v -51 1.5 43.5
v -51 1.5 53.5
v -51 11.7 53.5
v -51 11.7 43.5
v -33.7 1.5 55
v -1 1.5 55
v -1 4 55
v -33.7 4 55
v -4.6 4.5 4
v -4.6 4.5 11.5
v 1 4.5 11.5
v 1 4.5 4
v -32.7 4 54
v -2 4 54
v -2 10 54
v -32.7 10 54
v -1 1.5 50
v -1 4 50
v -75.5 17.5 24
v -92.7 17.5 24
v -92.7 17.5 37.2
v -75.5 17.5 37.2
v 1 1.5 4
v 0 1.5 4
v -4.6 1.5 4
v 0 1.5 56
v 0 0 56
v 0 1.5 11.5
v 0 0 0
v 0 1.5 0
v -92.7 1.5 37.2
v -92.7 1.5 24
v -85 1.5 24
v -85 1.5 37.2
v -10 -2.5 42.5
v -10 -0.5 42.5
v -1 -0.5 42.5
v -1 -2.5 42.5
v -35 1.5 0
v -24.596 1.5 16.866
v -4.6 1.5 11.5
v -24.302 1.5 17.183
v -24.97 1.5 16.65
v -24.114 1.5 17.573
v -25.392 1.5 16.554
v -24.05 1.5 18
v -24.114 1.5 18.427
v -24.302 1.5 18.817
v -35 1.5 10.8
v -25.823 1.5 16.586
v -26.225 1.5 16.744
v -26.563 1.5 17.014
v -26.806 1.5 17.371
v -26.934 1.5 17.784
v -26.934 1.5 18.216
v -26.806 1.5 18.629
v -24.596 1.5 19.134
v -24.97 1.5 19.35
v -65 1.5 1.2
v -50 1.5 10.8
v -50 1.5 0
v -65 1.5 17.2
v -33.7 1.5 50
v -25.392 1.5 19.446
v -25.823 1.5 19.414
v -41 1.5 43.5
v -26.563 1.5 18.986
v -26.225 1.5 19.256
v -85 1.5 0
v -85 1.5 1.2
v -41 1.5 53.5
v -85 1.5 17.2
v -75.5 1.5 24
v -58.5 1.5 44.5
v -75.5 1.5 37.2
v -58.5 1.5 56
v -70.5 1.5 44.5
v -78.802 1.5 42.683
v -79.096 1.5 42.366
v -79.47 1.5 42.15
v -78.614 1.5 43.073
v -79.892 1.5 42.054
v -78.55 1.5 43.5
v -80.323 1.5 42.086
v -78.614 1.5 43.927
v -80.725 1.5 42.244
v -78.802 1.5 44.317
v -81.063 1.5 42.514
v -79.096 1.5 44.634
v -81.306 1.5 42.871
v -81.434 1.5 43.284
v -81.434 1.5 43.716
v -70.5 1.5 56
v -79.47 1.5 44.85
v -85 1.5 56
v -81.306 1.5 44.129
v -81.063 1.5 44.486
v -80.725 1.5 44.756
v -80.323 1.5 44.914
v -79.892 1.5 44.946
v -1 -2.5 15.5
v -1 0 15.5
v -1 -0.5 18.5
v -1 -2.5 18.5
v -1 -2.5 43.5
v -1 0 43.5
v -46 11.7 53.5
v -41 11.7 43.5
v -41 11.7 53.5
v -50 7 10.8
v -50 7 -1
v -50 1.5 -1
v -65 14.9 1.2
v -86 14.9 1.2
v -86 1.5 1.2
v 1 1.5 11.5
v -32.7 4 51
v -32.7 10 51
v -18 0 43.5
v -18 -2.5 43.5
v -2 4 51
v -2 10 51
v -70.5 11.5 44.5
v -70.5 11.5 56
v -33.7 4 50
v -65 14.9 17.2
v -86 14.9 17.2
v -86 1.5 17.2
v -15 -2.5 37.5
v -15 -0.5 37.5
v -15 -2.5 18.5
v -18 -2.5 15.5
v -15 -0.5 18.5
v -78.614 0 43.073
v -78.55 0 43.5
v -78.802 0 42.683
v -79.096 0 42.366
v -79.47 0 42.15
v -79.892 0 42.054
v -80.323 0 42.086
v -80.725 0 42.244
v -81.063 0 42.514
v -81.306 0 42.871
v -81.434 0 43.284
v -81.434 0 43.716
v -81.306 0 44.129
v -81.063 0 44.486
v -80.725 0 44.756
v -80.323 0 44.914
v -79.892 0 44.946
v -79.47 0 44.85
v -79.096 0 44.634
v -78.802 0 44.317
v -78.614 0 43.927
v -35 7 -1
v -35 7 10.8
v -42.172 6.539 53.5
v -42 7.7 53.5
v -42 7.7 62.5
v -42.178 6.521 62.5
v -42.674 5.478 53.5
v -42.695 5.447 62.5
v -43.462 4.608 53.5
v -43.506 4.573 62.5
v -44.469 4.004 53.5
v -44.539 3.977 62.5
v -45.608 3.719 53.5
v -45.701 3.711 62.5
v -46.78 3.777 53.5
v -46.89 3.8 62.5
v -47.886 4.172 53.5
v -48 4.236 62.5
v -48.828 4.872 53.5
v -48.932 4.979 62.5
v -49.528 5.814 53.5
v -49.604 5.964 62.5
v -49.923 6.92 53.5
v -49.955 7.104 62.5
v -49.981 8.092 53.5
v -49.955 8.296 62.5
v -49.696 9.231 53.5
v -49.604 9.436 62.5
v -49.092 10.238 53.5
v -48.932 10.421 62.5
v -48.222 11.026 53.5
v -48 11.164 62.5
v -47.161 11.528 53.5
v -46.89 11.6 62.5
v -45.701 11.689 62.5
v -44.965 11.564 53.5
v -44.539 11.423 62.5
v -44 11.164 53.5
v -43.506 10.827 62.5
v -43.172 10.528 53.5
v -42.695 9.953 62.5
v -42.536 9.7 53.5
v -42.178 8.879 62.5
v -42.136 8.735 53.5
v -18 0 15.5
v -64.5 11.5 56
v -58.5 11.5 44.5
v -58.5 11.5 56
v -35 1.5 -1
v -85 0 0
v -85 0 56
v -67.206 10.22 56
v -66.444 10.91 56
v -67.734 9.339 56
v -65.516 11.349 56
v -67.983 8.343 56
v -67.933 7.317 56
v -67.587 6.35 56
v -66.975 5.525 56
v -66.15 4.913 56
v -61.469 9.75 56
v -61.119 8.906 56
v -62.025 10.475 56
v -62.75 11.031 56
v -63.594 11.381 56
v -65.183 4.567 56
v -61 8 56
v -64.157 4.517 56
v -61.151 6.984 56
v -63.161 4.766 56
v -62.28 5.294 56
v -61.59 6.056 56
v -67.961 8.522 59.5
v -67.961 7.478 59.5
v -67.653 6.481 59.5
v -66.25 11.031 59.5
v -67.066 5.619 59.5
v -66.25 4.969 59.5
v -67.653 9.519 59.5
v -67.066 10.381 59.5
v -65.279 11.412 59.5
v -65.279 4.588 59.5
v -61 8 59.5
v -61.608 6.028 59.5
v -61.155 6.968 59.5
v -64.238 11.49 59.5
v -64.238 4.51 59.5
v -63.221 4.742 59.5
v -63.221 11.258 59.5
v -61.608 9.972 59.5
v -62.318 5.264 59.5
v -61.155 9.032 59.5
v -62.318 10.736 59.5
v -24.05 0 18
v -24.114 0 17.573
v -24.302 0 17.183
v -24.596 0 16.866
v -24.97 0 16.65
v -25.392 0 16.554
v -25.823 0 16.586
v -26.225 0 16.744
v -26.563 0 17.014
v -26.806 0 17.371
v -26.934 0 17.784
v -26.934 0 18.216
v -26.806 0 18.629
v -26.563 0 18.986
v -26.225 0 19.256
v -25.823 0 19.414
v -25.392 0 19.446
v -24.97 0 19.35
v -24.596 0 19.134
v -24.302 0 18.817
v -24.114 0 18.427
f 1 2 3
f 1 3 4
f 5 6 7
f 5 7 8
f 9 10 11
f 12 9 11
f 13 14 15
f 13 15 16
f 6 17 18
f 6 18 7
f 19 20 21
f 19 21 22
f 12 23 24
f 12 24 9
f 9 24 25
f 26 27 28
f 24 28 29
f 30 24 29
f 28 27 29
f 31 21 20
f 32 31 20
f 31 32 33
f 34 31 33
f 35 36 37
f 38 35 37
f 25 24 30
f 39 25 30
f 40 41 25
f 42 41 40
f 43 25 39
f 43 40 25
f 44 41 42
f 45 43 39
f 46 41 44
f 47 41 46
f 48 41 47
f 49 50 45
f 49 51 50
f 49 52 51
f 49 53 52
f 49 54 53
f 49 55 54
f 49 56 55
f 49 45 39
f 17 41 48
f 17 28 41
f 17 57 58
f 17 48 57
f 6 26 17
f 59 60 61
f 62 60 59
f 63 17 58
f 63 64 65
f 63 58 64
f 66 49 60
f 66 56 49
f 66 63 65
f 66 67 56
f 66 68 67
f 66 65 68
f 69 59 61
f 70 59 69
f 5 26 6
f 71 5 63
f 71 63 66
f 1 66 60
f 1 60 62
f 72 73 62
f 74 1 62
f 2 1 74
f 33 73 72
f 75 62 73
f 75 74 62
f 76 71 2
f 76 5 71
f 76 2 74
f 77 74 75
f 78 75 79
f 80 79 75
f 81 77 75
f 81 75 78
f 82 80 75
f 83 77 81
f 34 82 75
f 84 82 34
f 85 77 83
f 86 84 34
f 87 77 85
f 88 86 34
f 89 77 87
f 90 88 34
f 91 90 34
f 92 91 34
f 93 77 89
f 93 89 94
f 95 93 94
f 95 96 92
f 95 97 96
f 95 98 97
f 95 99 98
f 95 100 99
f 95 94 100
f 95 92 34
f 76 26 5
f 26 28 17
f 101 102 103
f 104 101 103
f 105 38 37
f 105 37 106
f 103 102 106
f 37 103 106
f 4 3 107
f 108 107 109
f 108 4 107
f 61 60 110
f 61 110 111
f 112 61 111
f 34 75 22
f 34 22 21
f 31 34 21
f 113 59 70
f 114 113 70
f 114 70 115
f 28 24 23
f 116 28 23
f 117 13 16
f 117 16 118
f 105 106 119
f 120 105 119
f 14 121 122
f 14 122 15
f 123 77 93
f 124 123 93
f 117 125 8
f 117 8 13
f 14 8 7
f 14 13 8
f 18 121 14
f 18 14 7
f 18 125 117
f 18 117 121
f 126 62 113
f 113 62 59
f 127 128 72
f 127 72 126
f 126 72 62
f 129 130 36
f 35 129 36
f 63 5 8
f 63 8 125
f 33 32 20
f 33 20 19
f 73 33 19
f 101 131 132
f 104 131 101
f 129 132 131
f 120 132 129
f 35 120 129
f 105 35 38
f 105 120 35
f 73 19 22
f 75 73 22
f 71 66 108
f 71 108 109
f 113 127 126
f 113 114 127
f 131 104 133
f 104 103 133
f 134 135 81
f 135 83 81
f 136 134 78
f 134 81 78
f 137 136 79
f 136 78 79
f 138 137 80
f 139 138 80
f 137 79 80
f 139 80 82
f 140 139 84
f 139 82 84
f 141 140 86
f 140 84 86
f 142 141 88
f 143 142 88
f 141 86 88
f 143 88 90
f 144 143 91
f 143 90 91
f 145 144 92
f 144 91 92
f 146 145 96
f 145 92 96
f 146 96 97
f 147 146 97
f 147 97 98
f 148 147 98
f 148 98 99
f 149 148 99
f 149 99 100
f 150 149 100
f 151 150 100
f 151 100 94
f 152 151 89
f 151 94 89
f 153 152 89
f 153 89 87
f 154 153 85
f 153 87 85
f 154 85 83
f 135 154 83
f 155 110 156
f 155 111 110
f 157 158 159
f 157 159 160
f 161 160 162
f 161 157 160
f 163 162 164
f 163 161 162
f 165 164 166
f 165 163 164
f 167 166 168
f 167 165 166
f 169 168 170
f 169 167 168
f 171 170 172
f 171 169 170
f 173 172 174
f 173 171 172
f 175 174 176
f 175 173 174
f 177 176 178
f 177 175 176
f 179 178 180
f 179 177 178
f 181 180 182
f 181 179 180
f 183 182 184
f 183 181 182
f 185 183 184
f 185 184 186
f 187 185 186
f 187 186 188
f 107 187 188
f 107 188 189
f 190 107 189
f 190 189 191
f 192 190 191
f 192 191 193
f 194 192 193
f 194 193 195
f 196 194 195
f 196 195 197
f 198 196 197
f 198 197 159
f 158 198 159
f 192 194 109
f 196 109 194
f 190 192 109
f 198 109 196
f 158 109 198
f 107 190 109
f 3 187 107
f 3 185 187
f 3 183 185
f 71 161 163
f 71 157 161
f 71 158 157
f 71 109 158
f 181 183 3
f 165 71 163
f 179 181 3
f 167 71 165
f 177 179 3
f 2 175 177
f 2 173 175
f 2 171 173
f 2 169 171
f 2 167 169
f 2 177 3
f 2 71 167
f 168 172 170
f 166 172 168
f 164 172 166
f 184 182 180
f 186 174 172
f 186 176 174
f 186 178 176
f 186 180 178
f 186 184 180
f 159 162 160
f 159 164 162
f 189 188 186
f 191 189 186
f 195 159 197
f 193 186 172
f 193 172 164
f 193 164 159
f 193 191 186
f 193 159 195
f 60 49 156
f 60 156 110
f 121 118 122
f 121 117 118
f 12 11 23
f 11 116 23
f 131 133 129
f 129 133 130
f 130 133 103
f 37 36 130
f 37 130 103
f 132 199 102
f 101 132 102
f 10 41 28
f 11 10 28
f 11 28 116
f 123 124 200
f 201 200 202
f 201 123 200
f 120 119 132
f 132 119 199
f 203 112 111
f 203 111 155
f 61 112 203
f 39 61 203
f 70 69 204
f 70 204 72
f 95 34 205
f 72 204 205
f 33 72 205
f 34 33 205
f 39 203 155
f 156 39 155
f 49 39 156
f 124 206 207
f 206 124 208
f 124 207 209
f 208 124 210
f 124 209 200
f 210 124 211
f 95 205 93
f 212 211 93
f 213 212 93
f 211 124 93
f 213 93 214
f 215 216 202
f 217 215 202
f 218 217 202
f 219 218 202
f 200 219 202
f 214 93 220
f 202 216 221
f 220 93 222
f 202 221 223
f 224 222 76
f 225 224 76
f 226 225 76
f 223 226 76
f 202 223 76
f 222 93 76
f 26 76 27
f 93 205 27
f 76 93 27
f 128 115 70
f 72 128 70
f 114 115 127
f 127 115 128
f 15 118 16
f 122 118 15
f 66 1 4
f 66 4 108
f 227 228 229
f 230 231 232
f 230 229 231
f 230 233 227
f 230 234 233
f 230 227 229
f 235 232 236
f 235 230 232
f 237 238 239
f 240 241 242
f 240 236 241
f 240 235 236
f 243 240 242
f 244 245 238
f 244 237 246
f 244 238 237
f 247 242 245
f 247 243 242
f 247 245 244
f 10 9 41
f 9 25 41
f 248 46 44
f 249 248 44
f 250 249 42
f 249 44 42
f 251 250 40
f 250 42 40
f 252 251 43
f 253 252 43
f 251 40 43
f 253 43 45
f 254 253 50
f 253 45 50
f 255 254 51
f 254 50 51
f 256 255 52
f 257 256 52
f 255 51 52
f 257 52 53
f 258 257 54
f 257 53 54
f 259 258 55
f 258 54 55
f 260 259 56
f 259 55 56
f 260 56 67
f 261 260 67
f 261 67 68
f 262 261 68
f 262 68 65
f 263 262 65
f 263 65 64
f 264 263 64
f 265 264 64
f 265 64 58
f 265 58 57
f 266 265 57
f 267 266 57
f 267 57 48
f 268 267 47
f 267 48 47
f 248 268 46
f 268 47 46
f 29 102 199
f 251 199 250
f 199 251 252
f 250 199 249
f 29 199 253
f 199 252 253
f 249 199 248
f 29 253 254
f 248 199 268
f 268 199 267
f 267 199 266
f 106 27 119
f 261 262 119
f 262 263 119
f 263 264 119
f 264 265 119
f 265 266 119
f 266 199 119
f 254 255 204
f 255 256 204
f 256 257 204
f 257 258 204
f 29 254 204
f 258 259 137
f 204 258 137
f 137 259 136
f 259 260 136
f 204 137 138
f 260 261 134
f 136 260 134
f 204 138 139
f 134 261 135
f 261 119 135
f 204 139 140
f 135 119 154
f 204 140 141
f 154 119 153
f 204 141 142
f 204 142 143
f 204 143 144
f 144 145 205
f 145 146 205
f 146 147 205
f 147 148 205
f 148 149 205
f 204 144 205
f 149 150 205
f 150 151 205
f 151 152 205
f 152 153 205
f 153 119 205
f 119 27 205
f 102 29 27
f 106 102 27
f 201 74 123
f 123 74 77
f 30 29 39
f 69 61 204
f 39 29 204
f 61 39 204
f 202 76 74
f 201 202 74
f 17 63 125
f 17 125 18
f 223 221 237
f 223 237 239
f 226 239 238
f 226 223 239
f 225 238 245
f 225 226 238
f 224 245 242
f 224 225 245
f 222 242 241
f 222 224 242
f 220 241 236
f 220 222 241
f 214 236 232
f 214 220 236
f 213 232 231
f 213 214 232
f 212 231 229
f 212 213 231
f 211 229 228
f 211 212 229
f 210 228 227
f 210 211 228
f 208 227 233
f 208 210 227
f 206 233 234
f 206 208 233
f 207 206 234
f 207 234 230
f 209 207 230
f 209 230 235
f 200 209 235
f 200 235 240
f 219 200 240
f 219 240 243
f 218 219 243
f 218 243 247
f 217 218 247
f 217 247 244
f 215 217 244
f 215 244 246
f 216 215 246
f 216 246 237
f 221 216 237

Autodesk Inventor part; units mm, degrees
ref_plane "YZ Plane" through (0, 0, 0) normal (1, 0, 0) x (0, 1, 0)
ref_plane "XZ Plane" through (0, 0, 0) normal (0, 1, 0) x (-1, 0, 0)
ref_plane "XY Plane" through (0, 0, 0) normal (0, 0, 1) x (1, 0, 0)
sketch "Skizze1" plane through (0, 0, 0) normal (0, 1, 0) x (-1, 0, 0)
  line L0 (0, 0) -> (85, 0)
  line L1 (85, 0) -> (85, 56)
  line L2 (85, 56) -> (0, 56)
  line L3 (0, 56) -> (0, 0)
  dimension "d0" = 85
  dimension "d1" = 56
extrude "Extrusion1" add sketch "Skizze1" along normal blind 1.5
sketch "Skizze2" plane through (0, 1.5, 0) normal (0, 1, 0) x (1, 0, 0)
  line L0 (0, 0) -> (-85, 0) projected
  line L1 (-86, -17.2) -> (-65, -17.2)
  line L2 (-65, -17.2) -> (-65, -1.2)
  line L3 (-65, -1.2) -> (-86, -1.2)
  line L4 (-86, -1.2) -> (-86, -17.2)
  line L5 (-85, 0) -> (-85, -56) projected
  dimension "d4" = 21
  dimension "d5" = 16
  dimension "d6" = 1.2
  dimension "d84" = 1
extrude "Extrusion2" add sketch "Skizze2" along normal blind 13.4
sketch "Skizze3" plane through (0, 1.5, 0) normal (0, 1, 0) x (1, 0, 0)
  line L0 (-85, -17.2) -> (-85, -56) projected
  line L1 (-92.7, -24) -> (-75.5, -24)
  line L2 (-75.5, -24) -> (-75.5, -37.2)
  line L3 (-75.5, -37.2) -> (-92.7, -37.2)
  line L4 (-92.7, -37.2) -> (-92.7, -24)
  line L5 (-85, -56) -> (0, -56) projected
  dimension "d9" = 7.7
  dimension "d10" = 17.2
  dimension "d11" = 13.2
  dimension "d85" = 18.8
extrude "Extrusion3" add sketch "Skizze3" along normal blind 16
sketch "Skizze4" plane through (0, 1.5, 0) normal (0, 1, 0) x (1, 0, 0)
  line L0 (0, 0) -> (-85, 0) projected
  line L1 (-65, -1.2) -> (-65, -17.2) projected
  line L2 (-50, 1) -> (-35, 1)
  line L3 (-35, 1) -> (-35, -10.8)
  line L4 (-35, -10.8) -> (-50, -10.8)
  line L5 (-50, -10.8) -> (-50, 1)
  dimension "d15" = 1
  dimension "d16" = 15
  dimension "d17" = 11.8
  dimension "d18" = 15
extrude "Extrusion4" add sketch "Skizze4" along normal blind 5.5
sketch "Skizze5" plane through (0, 1.5, 0) normal (0, 1, 0) x (1, 0, 0)
  line L0 (-85, -37.2) -> (-85, -56) projected
  line L1 (-85, -56) -> (0, -56) projected
  line L2 (-58.5, -44.5) -> (-70.5, -44.5)
  line L3 (-70.5, -44.5) -> (-70.5, -56)
  line L4 (-70.5, -56) -> (-58.5, -56)
  line L5 (-58.5, -56) -> (-58.5, -44.5)
  line L6 (-70.5, -56) -> (-58.5, -56)
  dimension "d21" = 11.5
  dimension "d22" = 12
  dimension "d23" = 14.5
extrude "Extrusion5" add sketch "Skizze5" along normal blind 10
sketch "Skizze6" plane through (-85, 0, 56) normal (0, 0, 1) x (1, 0, 0)
  line L0 (14.5, 11.5) -> (26.5, 11.5) projected
  circle A0 centre (20.5, 8) radius 3.5
  dimension "d26" = 7
  dimension "d27" = 3.5
extrude "Extrusion6" add sketch "Skizze6" along normal blind 3.5
sketch "Skizze7" plane through (0, 1.5, 0) normal (0, 1, 0) x (1, 0, 0)
  line L0 (-58.5, -44.5) -> (-58.5, -56) projected
  line L1 (-58.5, -56) -> (0, -56) projected
  line L2 (-51, -43.5) -> (-41, -43.5)
  line L3 (-41, -43.5) -> (-41, -53.5)
  line L4 (-41, -53.5) -> (-51, -53.5)
  line L5 (-51, -53.5) -> (-51, -43.5)
  dimension "d30" = 10
  dimension "d31" = 10
  dimension "d32" = 2.5
  dimension "d33" = 7.5
extrude "Extrusion7" add sketch "Skizze7" along normal blind 10.2
sketch "Skizze8" plane through (-51, 1.5, 53.5) normal (0, 0, 1) x (1, 0, 0)
  line L0 (0, 10.2) -> (10, 10.2) projected
  circle A0 centre (5, 6.2) radius 4
  point P0 (51, -1.5)
  dimension "d36" = 8
  dimension "d37" = 0
extrude "Extrusion8" add sketch "Skizze8" along normal blind 9
sketch "Skizze9" plane through (0, 1.5, 0) normal (0, 1, 0) x (1, 0, 0)
  line L0 (-58.5, -56) -> (0, -56) projected
  line L1 (0, -56) -> (0, 0) projected
  line L2 (-1, -55) -> (-33.7, -55)
  line L3 (-33.7, -55) -> (-33.7, -50)
  line L4 (-33.7, -50) -> (-1, -50)
  line L5 (-1, -50) -> (-1, -55)
  dimension "d40" = 32.7
  dimension "d41" = 5
  dimension "d42" = 1
  dimension "d43" = 1
extrude "Extrusion9" add sketch "Skizze9" along normal blind 2.5
sketch "Skizze10" plane through (0, 4, 0) normal (0, 1, 0) x (1, 0, 0)
  line L0 (-33.7, -55) -> (-1, -55) projected
  line L1 (-1, -55) -> (-1, -50) projected
  line L2 (-1, -50) -> (-33.7, -50) projected
  line L3 (-33.7, -50) -> (-33.7, -55) projected
  line L4 (-32.7, -51) -> (-2, -51)
  line L5 (-2, -51) -> (-2, -54)
  line L6 (-2, -54) -> (-32.7, -54)
  line L7 (-32.7, -54) -> (-32.7, -51)
  point P0 (0, 0)
  dimension "d50" = 1
  dimension "d51" = 1
  dimension "d52" = 1
  dimension "d53" = 1
extrude "Extrusion10" add sketch "Skizze10" along normal blind 6 contours L4 L5 L6 L7
sketch "Skizze11" plane through (0, 1.5, 0) normal (0, 1, 0) x (1, 0, 0)
  line L0 (0, -56) -> (0, 0) projected
  line L1 (0, 0) -> (-35, 0) projected
  line L2 (1, -4) -> (-4.6, -4)
  line L3 (-4.6, -4) -> (-4.6, -11.5)
  line L4 (-4.6, -11.5) -> (1, -11.5)
  line L5 (1, -11.5) -> (1, -4)
  dimension "d56" = 1
  dimension "d57" = 7.5
  dimension "d58" = 5.6
  dimension "d59" = 4
extrude "Extrusion11" add sketch "Skizze11" along normal blind 3
sketch "Skizze12" plane through (0, 0, 0) normal (0, -1, 0) x (1, 0, 0)
  line L0 (0, 0) -> (-85, 0) projected
  line L1 (0, 56) -> (0, 0) projected
  line L2 (-1, 43.5) -> (-18, 43.5)
  line L3 (-18, 43.5) -> (-18, 15.5)
  line L4 (-18, 15.5) -> (-1, 15.5)
  line L5 (-1, 15.5) -> (-1, 43.5)
  dimension "d62" = 15.5
  dimension "d63" = 17
  dimension "d64" = 28
  dimension "d65" = 1
extrude "Extrusion12" add sketch "Skizze12" along normal blind 0.5
sketch "Skizze13" plane through (0, -0.5, 0) normal (0, -1, 0) x (1, 0, 0)
  line L0 (-1, 43.5) -> (-18, 43.5) projected
  line L1 (-18, 43.5) -> (-18, 15.5) projected
  line L2 (-18, 15.5) -> (-1, 15.5) projected
  line L3 (-1, 15.5) -> (-1, 43.5) projected
  line L4 (-15, 42.5) -> (-1, 42.5)
  line L5 (-1, 42.5) -> (-1, 18.5)
  line L6 (-1, 18.5) -> (-15, 18.5)
  line L7 (-15, 18.5) -> (-15, 42.5)
  line L8 (-15, 37.5) -> (-10, 42.5)
  line L9 (-15, 37.5) -> (-7.9289, 37.5) construction
  point P0 (0, 0)
  dimension "d69" = 24
  dimension "d70" = 3
  dimension "d71" = 3
  dimension "d72" = 45
  dimension "d73" = 19
extrude "Extrusion13" add sketch "Skizze13" along normal blind 2 contours L3 L4 L7 L6 L2 L1 L0 | L8 L7 L4
sketch "Skizze14" plane through (0, 1.5, 0) normal (0, 1, 0) x (1, 0, 0)
  line L0 (0, 0) -> (-35, 0) projected
  line L1 (-85, -37.2) -> (-85, -56) projected
  line L2 (-85, -56) -> (-70.5, -56) projected
  line L3 (0, -56) -> (0, -11.5) projected
  circle A0 centre (-25.5, -18) radius 1.45
  circle A1 centre (-80, -43.5) radius 1.45
  dimension "d76" = 2.9
  dimension "d77" = 25.5
  dimension "d78" = 18
  dimension "d79" = 2.9
  dimension "d80" = 5
  dimension "d81" = 12.5
extrude "Extrusion14" cut sketch "Skizze14" against normal through all
properties part number "PCB"
